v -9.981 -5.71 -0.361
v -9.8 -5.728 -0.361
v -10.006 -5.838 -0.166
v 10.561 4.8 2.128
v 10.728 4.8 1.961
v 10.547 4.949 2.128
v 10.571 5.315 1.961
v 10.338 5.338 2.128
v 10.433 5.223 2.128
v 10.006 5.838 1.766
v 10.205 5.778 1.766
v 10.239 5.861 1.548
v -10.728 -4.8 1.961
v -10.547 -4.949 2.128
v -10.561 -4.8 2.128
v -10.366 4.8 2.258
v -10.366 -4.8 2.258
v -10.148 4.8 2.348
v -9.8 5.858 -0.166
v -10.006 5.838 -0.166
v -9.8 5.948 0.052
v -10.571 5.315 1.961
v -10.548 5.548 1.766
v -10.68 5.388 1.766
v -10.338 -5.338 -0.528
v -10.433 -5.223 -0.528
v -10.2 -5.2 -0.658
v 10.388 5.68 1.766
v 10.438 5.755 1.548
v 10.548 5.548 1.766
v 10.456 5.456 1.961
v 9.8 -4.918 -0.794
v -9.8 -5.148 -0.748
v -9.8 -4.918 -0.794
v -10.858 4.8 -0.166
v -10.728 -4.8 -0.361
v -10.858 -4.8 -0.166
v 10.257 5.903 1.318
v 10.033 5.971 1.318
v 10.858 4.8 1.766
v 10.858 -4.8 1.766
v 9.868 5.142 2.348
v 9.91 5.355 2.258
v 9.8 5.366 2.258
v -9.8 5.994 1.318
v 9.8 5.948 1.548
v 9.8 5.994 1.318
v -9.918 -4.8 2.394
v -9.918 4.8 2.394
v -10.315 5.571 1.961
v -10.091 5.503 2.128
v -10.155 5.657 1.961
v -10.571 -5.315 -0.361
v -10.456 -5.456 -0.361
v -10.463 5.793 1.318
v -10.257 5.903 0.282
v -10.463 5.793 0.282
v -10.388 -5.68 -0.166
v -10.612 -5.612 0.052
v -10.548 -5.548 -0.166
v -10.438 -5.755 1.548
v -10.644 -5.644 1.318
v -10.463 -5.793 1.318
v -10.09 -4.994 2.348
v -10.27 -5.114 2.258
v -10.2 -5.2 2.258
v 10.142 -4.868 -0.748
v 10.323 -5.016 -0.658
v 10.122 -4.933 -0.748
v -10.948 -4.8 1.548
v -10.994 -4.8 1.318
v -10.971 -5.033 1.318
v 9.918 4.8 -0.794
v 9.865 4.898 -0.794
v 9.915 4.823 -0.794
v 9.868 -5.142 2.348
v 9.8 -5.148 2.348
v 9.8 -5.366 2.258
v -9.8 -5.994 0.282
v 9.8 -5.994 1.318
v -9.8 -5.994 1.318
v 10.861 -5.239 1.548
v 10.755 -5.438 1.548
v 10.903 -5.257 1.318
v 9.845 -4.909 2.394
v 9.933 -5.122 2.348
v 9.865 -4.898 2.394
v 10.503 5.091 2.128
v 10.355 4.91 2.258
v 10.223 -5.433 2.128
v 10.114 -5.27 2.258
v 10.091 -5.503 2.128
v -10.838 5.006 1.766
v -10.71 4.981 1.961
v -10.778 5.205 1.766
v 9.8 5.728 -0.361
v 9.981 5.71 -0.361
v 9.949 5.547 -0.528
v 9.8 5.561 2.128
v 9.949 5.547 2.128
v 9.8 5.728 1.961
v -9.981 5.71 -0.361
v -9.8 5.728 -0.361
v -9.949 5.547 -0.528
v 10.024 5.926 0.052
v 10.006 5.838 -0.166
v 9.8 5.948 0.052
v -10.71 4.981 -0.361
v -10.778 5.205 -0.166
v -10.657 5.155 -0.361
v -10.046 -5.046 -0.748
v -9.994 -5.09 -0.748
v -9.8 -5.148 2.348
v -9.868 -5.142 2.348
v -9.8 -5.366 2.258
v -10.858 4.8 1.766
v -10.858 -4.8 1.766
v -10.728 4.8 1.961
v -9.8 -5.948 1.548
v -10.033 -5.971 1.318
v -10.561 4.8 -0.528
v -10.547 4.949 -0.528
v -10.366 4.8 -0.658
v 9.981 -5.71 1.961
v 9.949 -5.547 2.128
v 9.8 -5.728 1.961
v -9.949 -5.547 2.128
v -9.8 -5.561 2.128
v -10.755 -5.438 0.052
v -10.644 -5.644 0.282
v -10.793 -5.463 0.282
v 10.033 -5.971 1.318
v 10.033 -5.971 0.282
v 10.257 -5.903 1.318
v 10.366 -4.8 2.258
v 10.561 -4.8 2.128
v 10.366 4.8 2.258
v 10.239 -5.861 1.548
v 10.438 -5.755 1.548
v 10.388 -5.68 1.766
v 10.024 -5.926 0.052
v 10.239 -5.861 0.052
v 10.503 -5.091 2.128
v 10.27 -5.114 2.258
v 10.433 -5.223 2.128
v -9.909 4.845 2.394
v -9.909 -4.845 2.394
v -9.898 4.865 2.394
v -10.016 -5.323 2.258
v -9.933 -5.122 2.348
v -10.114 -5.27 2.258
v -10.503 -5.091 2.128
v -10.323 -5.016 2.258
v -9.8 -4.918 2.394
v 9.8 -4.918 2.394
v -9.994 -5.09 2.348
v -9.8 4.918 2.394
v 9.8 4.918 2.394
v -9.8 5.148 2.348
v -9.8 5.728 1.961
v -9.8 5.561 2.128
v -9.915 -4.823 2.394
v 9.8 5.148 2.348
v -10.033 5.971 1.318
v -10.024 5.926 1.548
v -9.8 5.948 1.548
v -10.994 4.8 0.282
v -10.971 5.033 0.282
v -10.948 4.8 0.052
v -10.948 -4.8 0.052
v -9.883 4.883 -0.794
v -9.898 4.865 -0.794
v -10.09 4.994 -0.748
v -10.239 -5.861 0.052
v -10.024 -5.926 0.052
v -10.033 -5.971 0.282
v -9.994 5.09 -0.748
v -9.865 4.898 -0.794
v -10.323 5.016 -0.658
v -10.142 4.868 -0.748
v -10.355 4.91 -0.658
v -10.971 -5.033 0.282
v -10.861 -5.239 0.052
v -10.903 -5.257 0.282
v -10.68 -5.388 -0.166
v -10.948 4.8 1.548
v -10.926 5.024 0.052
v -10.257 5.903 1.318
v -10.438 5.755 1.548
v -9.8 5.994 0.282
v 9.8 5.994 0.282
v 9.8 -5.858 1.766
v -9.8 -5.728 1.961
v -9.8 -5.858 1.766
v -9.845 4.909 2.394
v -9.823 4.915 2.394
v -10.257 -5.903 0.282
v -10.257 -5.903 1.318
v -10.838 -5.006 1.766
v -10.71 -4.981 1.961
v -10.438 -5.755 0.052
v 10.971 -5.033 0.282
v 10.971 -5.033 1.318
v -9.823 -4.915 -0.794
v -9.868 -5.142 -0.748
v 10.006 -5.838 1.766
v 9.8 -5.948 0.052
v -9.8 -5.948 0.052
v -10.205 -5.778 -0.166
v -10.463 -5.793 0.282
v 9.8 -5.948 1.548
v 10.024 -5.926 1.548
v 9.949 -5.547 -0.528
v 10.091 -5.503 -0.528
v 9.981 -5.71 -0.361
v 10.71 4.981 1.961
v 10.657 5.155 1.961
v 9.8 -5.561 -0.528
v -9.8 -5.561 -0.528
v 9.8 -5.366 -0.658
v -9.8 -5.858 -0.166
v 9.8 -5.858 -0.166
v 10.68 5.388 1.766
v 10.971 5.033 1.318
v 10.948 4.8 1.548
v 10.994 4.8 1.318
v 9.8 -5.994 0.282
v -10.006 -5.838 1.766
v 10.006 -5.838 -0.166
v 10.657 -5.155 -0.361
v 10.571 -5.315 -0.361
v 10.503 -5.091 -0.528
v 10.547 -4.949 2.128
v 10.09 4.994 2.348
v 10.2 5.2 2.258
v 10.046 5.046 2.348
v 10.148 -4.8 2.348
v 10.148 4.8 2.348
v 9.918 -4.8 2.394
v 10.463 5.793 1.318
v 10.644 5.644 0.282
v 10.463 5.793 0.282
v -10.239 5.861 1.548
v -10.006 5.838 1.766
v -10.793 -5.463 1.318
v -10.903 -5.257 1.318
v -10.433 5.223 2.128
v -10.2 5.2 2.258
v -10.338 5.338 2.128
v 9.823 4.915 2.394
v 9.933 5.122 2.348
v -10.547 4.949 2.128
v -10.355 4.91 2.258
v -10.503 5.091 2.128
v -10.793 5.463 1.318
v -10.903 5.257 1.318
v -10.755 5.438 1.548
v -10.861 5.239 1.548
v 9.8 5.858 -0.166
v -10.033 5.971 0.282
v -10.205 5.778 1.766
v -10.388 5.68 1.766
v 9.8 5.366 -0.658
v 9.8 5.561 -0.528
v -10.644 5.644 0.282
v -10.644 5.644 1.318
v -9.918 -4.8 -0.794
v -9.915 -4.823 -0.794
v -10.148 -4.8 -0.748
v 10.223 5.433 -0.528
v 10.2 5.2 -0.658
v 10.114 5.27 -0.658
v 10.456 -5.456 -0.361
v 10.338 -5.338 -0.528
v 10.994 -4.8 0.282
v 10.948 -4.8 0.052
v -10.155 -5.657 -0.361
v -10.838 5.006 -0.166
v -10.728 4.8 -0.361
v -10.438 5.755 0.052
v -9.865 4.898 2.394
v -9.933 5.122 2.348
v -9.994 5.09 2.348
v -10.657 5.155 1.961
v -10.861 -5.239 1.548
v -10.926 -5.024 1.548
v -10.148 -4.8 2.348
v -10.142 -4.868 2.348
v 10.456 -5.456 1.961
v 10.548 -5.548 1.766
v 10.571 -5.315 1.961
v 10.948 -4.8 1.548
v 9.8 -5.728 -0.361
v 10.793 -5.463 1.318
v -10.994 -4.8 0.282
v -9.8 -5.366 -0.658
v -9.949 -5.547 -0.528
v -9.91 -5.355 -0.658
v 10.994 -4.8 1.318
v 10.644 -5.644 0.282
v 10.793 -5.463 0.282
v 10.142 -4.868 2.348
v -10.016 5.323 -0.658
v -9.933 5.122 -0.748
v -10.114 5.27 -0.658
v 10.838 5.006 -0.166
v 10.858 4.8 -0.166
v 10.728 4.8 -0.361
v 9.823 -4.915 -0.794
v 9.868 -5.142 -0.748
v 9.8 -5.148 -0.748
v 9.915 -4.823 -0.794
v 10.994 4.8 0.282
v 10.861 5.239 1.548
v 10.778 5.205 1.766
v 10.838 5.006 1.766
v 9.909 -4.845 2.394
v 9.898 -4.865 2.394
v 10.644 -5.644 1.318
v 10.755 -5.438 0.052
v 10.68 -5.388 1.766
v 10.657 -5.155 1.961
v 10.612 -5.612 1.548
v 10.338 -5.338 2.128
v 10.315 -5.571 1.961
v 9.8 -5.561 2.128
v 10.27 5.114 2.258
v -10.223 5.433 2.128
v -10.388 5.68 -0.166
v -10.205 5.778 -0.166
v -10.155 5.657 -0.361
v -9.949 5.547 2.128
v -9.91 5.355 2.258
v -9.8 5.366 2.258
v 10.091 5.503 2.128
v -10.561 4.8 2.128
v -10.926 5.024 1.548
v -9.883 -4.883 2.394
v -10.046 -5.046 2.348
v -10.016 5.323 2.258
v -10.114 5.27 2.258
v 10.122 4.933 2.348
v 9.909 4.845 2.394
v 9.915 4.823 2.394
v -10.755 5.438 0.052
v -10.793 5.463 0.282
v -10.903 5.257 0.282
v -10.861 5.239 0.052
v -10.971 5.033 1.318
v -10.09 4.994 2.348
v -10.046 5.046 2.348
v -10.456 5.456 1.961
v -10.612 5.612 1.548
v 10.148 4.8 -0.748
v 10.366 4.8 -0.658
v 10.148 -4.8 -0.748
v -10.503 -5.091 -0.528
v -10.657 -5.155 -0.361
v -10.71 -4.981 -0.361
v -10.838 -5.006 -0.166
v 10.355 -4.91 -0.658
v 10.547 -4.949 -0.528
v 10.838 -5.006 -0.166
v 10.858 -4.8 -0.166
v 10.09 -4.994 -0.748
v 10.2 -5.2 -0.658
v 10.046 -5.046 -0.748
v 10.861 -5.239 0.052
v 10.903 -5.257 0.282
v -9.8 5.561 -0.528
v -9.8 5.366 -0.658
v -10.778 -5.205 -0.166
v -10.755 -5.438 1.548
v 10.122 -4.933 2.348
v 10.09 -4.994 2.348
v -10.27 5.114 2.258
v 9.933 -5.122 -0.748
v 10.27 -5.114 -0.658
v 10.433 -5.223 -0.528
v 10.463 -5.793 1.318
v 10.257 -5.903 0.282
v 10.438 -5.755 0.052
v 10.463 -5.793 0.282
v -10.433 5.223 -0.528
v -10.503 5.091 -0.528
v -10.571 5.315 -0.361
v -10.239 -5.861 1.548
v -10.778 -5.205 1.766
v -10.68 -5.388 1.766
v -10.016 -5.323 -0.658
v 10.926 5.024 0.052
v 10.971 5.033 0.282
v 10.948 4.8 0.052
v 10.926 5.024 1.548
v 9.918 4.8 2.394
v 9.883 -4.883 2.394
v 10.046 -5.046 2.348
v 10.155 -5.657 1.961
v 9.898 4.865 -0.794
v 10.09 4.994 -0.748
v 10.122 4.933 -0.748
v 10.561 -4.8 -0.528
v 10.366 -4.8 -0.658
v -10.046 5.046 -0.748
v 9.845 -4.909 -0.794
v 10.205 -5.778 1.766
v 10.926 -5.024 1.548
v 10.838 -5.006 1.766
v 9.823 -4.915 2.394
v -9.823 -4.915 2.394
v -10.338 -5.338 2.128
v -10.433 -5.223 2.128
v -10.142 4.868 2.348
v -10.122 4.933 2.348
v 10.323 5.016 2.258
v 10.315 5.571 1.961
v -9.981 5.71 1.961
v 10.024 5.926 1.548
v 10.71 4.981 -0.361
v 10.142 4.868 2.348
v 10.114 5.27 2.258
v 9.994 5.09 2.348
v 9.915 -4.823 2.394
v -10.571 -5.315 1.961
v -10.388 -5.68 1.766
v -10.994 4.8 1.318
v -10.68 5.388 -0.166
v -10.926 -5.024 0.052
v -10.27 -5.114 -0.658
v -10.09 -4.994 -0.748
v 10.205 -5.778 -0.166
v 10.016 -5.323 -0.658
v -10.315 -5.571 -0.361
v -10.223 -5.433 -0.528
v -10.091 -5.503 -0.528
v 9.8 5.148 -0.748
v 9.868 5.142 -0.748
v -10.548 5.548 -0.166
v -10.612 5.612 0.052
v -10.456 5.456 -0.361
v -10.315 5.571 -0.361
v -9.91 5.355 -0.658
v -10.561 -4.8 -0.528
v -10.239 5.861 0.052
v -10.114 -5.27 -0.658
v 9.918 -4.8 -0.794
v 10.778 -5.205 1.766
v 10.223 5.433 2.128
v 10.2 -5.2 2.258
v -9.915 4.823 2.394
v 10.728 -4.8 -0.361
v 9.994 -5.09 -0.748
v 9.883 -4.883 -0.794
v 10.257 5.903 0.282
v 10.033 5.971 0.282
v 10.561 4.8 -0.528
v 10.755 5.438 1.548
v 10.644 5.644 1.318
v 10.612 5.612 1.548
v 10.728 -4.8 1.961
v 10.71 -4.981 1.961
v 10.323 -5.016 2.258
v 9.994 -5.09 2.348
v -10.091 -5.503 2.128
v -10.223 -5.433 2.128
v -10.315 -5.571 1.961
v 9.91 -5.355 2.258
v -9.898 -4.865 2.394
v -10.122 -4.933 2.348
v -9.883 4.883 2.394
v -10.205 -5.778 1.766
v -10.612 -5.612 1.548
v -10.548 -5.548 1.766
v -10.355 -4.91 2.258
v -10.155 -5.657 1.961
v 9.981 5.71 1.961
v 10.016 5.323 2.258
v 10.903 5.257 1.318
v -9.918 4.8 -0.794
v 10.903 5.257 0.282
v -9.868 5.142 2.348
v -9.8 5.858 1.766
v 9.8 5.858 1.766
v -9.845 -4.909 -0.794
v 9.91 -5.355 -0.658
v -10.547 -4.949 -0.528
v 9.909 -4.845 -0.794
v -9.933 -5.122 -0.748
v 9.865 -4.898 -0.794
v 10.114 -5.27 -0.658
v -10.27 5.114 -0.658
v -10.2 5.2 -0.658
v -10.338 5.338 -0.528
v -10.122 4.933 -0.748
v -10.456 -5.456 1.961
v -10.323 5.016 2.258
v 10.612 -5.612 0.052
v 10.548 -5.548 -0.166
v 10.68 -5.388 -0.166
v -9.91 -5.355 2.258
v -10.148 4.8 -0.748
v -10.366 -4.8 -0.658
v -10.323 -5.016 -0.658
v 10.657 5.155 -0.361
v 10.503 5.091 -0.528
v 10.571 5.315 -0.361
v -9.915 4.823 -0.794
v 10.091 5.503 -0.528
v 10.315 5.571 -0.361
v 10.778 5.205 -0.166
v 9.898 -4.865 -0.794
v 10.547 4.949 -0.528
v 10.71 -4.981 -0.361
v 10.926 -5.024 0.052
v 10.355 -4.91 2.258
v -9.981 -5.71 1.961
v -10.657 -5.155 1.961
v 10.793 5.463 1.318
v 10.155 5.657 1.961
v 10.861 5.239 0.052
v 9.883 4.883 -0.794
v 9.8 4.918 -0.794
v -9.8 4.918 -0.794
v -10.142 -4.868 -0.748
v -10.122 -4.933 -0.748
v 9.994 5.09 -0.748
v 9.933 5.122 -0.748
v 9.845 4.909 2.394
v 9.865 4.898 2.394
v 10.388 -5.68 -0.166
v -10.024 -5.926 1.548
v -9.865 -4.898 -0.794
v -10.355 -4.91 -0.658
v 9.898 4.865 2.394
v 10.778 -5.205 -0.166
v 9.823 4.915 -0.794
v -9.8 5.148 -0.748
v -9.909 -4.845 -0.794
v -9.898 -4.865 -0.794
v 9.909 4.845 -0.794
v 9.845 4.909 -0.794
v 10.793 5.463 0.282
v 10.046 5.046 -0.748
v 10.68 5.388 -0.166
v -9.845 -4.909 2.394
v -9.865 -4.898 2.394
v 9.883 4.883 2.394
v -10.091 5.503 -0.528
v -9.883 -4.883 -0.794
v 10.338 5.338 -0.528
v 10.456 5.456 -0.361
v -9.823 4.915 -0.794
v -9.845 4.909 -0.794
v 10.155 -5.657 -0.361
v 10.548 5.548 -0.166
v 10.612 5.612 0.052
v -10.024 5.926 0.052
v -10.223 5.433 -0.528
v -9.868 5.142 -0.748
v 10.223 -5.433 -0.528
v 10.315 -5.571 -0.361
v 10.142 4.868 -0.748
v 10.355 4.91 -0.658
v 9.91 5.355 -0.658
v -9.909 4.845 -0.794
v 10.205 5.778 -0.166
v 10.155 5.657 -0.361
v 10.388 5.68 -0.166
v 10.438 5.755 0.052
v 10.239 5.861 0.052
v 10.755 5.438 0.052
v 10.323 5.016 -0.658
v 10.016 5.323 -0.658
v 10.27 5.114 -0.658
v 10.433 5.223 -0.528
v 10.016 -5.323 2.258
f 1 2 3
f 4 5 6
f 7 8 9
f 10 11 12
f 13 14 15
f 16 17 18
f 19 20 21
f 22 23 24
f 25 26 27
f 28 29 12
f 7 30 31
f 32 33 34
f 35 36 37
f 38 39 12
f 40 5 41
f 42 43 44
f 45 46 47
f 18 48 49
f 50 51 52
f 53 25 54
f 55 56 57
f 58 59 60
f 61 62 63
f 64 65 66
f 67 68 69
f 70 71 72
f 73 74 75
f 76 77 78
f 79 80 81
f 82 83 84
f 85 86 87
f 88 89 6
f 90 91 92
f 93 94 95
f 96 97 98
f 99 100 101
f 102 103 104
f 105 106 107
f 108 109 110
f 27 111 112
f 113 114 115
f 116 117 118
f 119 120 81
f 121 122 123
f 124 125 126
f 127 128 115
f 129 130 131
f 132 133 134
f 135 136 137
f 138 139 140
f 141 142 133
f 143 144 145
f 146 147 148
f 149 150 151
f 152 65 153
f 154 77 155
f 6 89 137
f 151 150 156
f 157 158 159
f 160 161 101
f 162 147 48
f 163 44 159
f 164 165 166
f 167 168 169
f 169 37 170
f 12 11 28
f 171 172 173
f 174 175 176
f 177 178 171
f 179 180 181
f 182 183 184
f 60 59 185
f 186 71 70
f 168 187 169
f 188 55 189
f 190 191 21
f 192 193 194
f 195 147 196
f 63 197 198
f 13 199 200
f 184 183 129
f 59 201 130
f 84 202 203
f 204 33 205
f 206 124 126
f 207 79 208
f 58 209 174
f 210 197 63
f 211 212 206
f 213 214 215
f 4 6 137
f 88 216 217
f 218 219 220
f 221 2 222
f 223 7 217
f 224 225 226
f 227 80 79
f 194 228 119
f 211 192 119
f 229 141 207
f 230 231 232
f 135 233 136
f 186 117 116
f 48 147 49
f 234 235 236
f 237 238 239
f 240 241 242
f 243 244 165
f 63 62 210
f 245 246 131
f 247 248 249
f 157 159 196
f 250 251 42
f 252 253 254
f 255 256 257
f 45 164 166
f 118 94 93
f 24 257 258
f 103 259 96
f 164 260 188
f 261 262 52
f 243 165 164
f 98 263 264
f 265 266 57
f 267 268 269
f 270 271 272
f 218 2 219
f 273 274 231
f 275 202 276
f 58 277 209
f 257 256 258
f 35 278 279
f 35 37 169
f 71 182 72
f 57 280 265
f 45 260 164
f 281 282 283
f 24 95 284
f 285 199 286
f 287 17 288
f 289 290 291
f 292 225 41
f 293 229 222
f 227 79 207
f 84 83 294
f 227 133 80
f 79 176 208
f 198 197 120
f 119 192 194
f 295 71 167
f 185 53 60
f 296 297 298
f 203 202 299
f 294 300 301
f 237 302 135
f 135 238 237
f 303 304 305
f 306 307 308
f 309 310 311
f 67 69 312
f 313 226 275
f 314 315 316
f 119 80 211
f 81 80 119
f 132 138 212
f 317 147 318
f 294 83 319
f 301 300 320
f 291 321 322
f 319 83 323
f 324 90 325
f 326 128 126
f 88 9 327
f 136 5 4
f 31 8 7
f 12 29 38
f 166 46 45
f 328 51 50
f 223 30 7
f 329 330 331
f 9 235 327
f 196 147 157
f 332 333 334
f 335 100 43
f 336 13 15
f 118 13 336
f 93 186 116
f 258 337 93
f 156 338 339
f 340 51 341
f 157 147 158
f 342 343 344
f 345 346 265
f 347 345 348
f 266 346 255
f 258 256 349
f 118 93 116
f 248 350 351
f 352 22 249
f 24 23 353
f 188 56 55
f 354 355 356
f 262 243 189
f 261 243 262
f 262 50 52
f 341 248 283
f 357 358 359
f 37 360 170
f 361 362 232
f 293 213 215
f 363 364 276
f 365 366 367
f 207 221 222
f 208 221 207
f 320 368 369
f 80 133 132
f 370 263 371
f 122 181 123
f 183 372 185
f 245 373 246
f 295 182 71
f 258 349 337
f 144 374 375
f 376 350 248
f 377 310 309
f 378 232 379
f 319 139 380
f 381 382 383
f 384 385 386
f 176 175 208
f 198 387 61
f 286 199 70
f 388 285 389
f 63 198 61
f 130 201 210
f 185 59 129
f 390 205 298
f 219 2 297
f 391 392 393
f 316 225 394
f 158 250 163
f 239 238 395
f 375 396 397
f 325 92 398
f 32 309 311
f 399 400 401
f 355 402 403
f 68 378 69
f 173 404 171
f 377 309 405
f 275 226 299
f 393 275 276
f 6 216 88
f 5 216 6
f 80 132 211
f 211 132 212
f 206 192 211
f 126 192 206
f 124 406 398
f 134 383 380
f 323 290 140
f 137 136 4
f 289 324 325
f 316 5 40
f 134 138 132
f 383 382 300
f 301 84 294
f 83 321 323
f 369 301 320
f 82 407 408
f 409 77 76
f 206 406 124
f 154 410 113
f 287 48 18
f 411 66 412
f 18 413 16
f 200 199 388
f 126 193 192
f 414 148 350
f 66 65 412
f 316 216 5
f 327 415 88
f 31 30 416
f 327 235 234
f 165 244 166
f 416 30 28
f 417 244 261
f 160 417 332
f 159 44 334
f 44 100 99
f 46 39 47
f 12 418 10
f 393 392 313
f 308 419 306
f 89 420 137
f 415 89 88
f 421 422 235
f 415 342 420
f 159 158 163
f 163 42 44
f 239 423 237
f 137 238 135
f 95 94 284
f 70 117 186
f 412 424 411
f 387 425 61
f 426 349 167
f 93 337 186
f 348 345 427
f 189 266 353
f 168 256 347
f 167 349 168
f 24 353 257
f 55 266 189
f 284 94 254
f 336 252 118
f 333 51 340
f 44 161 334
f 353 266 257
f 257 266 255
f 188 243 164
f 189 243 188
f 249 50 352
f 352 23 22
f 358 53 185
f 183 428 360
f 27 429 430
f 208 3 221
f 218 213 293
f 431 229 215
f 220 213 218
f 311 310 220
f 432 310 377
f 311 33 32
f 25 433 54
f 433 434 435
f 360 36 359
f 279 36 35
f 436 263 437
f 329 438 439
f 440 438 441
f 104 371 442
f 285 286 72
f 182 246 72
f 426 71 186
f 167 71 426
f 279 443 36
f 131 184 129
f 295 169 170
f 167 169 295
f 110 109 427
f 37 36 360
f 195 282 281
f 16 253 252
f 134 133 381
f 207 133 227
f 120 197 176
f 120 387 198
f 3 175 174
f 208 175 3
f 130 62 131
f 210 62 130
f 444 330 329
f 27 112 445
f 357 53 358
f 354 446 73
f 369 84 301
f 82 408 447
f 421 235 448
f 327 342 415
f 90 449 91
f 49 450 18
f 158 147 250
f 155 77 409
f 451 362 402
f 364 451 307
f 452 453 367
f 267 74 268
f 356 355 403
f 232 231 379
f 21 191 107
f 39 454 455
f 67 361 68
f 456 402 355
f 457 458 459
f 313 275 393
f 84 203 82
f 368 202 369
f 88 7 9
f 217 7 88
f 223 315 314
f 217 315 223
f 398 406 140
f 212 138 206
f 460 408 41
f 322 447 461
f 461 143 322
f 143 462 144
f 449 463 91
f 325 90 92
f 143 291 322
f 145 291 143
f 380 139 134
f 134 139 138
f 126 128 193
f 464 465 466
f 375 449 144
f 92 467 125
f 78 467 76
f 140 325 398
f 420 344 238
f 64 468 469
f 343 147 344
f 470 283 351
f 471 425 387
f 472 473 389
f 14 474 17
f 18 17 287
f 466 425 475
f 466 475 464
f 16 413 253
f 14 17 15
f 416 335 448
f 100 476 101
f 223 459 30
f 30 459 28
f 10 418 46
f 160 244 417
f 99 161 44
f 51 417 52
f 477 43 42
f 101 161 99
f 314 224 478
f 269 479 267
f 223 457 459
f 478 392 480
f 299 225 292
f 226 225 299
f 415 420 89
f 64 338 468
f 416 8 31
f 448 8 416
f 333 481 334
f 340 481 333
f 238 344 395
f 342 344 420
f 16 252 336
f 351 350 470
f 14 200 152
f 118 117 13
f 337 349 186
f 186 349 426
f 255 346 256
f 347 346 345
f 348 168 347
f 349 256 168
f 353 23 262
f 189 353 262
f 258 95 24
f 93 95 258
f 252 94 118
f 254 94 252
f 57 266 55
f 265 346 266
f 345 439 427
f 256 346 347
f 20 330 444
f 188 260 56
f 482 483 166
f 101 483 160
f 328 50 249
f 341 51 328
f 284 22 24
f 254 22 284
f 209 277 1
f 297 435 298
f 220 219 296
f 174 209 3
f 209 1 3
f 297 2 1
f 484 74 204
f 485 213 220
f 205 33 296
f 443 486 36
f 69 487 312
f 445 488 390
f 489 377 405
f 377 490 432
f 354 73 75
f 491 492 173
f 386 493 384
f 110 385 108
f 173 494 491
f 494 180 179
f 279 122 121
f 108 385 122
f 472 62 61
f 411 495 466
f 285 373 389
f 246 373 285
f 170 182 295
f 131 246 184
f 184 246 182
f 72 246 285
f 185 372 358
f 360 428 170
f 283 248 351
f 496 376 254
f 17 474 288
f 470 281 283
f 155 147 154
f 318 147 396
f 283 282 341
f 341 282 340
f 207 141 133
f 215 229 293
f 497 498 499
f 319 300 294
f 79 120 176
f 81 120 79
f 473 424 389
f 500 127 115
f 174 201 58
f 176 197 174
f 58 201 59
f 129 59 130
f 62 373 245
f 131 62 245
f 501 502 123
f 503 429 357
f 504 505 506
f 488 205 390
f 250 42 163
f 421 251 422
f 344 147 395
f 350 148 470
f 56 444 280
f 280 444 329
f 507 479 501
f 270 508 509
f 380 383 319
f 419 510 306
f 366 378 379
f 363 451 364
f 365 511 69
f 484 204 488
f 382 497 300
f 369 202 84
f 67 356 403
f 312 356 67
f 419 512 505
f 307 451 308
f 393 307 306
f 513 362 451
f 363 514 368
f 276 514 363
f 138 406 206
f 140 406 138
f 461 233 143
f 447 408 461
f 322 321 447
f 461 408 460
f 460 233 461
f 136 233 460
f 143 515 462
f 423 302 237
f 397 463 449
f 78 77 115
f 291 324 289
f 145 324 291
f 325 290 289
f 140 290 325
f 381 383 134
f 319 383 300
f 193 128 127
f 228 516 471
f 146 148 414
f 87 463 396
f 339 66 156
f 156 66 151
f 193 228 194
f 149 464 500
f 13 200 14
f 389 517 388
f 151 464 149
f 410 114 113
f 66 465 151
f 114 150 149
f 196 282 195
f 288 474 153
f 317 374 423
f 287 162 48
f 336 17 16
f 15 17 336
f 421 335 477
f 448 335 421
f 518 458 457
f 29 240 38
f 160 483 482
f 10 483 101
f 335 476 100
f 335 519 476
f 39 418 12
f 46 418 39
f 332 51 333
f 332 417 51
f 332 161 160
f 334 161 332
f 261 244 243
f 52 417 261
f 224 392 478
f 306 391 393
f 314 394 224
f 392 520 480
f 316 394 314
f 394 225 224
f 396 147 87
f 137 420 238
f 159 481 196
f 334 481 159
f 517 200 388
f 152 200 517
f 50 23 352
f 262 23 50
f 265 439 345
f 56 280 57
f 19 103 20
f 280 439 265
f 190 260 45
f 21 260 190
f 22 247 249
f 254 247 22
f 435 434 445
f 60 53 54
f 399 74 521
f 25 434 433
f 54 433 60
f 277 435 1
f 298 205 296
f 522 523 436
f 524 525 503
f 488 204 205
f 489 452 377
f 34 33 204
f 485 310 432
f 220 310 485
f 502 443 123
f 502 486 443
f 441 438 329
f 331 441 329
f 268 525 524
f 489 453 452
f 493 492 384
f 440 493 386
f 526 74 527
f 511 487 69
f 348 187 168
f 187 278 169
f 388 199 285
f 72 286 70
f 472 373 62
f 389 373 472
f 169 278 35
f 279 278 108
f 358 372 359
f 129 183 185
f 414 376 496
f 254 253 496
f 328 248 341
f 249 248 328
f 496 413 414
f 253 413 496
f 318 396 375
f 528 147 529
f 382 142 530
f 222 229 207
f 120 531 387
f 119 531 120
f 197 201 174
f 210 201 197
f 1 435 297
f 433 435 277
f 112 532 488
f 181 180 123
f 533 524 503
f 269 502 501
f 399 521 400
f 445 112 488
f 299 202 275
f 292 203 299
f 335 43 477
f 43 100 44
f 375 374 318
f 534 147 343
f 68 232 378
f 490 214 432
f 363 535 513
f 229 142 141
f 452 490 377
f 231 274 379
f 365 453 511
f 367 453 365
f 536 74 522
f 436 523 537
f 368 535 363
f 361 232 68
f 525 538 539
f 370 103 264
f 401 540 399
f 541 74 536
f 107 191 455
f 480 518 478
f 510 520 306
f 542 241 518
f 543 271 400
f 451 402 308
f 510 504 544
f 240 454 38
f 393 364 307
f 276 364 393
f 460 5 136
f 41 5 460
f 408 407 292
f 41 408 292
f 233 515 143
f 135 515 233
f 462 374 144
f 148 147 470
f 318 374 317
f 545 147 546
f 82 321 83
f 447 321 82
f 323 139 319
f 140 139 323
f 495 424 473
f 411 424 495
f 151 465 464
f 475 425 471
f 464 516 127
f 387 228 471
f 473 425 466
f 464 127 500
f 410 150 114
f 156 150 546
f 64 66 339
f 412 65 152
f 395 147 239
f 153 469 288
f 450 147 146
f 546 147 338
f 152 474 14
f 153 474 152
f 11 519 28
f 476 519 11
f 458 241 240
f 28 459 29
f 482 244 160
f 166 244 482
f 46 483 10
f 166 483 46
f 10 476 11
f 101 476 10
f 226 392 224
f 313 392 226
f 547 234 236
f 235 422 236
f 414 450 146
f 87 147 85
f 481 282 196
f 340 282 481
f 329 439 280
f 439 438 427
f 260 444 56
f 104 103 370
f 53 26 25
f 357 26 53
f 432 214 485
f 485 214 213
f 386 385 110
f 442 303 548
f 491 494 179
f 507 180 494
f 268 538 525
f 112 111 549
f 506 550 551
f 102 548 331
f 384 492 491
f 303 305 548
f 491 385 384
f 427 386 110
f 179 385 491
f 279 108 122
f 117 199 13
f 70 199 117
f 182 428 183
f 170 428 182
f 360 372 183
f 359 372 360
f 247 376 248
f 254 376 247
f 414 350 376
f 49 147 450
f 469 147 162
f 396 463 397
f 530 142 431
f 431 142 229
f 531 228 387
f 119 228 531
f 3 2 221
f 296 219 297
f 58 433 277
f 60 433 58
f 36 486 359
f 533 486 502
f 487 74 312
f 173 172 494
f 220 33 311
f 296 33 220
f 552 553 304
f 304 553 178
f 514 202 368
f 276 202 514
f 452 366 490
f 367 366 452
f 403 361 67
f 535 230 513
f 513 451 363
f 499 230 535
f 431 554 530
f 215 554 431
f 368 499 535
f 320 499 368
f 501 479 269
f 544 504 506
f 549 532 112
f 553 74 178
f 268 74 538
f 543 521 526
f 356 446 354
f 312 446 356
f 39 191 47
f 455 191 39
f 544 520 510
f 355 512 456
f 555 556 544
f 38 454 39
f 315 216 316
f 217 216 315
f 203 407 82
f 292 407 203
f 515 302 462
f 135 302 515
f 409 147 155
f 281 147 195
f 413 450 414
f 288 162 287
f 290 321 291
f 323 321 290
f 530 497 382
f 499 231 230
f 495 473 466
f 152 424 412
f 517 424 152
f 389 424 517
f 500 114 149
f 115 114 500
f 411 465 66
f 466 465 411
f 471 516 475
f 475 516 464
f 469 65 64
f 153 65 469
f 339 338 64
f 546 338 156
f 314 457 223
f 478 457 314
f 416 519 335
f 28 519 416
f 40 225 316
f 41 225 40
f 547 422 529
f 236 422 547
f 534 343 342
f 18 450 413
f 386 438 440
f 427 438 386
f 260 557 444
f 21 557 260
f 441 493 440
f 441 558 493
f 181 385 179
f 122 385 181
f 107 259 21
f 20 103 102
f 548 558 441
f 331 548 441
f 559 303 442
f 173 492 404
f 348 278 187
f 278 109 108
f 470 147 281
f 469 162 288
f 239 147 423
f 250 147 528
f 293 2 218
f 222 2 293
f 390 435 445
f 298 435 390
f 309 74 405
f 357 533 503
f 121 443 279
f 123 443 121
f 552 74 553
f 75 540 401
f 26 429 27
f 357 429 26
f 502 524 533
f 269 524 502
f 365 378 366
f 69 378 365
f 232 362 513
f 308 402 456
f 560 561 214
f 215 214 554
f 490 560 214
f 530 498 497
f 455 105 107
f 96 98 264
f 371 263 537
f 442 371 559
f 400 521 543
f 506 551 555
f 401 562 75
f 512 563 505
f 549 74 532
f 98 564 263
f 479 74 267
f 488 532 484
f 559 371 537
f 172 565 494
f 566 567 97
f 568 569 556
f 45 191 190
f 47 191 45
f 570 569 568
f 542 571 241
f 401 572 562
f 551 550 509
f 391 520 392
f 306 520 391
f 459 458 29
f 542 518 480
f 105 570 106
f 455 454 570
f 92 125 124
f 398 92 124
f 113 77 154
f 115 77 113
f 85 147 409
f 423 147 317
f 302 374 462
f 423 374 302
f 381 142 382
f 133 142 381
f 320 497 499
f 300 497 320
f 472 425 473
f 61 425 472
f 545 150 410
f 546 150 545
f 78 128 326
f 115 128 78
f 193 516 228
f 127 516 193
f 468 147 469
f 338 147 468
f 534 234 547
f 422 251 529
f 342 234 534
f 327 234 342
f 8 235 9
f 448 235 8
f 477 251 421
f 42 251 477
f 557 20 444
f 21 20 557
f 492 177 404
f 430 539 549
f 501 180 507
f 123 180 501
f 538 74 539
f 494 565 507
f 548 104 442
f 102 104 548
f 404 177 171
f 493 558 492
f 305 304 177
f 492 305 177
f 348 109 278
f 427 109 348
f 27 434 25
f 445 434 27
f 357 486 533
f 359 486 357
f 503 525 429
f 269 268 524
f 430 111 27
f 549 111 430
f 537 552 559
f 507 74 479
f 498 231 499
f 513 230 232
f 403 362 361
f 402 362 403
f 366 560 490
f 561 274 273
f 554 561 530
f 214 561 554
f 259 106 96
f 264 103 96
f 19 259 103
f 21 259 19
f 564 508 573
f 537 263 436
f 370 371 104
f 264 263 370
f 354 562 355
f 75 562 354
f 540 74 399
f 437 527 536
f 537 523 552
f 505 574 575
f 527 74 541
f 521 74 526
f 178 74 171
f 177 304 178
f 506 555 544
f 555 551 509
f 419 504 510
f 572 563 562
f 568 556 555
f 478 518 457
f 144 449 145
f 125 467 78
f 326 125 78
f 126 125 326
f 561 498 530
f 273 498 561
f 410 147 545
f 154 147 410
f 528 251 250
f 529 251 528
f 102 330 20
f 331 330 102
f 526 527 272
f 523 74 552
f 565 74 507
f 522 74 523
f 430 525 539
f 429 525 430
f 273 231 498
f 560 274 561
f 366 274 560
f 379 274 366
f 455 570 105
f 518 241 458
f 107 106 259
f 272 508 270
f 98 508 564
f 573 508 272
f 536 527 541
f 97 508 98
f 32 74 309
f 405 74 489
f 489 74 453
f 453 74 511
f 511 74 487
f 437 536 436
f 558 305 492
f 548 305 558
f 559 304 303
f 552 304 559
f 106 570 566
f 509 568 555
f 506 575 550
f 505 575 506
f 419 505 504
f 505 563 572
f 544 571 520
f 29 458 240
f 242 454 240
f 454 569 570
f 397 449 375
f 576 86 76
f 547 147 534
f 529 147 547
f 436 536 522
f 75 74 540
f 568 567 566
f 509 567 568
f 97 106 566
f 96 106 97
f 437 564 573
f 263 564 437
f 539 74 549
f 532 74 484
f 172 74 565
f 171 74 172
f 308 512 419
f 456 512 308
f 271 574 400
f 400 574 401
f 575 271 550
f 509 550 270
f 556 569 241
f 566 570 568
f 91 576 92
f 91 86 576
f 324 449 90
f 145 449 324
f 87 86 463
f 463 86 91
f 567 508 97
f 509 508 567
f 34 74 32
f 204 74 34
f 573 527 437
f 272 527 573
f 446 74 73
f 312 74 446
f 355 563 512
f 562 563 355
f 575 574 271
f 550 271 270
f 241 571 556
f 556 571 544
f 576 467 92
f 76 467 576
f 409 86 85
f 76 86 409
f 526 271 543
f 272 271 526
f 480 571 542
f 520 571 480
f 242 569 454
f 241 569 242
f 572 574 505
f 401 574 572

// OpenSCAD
// Buzzer Module (蜂鳴器模組) visual source for NexCAD.
// Units: millimeters. Origin: part bottom-center, matching src/parts/library.ts.
// This generated baseline is intentionally simple; refine it with measured details before exporting STL.

$fn = 32;

module rounded_box(size, r = 0.8) {
  hull() {
    for (x = [-size[0] / 2 + r, size[0] / 2 - r])
      for (y = [-size[1] / 2 + r, size[1] / 2 - r]) {
        translate([x, y, r]) sphere(r = r);
        translate([x, y, size[2] - r]) sphere(r = r);
      }
  }
}

color("#2e7d5b") rounded_box([22, 12, 1.6], min(1.2, min(22, 12) / 8));
